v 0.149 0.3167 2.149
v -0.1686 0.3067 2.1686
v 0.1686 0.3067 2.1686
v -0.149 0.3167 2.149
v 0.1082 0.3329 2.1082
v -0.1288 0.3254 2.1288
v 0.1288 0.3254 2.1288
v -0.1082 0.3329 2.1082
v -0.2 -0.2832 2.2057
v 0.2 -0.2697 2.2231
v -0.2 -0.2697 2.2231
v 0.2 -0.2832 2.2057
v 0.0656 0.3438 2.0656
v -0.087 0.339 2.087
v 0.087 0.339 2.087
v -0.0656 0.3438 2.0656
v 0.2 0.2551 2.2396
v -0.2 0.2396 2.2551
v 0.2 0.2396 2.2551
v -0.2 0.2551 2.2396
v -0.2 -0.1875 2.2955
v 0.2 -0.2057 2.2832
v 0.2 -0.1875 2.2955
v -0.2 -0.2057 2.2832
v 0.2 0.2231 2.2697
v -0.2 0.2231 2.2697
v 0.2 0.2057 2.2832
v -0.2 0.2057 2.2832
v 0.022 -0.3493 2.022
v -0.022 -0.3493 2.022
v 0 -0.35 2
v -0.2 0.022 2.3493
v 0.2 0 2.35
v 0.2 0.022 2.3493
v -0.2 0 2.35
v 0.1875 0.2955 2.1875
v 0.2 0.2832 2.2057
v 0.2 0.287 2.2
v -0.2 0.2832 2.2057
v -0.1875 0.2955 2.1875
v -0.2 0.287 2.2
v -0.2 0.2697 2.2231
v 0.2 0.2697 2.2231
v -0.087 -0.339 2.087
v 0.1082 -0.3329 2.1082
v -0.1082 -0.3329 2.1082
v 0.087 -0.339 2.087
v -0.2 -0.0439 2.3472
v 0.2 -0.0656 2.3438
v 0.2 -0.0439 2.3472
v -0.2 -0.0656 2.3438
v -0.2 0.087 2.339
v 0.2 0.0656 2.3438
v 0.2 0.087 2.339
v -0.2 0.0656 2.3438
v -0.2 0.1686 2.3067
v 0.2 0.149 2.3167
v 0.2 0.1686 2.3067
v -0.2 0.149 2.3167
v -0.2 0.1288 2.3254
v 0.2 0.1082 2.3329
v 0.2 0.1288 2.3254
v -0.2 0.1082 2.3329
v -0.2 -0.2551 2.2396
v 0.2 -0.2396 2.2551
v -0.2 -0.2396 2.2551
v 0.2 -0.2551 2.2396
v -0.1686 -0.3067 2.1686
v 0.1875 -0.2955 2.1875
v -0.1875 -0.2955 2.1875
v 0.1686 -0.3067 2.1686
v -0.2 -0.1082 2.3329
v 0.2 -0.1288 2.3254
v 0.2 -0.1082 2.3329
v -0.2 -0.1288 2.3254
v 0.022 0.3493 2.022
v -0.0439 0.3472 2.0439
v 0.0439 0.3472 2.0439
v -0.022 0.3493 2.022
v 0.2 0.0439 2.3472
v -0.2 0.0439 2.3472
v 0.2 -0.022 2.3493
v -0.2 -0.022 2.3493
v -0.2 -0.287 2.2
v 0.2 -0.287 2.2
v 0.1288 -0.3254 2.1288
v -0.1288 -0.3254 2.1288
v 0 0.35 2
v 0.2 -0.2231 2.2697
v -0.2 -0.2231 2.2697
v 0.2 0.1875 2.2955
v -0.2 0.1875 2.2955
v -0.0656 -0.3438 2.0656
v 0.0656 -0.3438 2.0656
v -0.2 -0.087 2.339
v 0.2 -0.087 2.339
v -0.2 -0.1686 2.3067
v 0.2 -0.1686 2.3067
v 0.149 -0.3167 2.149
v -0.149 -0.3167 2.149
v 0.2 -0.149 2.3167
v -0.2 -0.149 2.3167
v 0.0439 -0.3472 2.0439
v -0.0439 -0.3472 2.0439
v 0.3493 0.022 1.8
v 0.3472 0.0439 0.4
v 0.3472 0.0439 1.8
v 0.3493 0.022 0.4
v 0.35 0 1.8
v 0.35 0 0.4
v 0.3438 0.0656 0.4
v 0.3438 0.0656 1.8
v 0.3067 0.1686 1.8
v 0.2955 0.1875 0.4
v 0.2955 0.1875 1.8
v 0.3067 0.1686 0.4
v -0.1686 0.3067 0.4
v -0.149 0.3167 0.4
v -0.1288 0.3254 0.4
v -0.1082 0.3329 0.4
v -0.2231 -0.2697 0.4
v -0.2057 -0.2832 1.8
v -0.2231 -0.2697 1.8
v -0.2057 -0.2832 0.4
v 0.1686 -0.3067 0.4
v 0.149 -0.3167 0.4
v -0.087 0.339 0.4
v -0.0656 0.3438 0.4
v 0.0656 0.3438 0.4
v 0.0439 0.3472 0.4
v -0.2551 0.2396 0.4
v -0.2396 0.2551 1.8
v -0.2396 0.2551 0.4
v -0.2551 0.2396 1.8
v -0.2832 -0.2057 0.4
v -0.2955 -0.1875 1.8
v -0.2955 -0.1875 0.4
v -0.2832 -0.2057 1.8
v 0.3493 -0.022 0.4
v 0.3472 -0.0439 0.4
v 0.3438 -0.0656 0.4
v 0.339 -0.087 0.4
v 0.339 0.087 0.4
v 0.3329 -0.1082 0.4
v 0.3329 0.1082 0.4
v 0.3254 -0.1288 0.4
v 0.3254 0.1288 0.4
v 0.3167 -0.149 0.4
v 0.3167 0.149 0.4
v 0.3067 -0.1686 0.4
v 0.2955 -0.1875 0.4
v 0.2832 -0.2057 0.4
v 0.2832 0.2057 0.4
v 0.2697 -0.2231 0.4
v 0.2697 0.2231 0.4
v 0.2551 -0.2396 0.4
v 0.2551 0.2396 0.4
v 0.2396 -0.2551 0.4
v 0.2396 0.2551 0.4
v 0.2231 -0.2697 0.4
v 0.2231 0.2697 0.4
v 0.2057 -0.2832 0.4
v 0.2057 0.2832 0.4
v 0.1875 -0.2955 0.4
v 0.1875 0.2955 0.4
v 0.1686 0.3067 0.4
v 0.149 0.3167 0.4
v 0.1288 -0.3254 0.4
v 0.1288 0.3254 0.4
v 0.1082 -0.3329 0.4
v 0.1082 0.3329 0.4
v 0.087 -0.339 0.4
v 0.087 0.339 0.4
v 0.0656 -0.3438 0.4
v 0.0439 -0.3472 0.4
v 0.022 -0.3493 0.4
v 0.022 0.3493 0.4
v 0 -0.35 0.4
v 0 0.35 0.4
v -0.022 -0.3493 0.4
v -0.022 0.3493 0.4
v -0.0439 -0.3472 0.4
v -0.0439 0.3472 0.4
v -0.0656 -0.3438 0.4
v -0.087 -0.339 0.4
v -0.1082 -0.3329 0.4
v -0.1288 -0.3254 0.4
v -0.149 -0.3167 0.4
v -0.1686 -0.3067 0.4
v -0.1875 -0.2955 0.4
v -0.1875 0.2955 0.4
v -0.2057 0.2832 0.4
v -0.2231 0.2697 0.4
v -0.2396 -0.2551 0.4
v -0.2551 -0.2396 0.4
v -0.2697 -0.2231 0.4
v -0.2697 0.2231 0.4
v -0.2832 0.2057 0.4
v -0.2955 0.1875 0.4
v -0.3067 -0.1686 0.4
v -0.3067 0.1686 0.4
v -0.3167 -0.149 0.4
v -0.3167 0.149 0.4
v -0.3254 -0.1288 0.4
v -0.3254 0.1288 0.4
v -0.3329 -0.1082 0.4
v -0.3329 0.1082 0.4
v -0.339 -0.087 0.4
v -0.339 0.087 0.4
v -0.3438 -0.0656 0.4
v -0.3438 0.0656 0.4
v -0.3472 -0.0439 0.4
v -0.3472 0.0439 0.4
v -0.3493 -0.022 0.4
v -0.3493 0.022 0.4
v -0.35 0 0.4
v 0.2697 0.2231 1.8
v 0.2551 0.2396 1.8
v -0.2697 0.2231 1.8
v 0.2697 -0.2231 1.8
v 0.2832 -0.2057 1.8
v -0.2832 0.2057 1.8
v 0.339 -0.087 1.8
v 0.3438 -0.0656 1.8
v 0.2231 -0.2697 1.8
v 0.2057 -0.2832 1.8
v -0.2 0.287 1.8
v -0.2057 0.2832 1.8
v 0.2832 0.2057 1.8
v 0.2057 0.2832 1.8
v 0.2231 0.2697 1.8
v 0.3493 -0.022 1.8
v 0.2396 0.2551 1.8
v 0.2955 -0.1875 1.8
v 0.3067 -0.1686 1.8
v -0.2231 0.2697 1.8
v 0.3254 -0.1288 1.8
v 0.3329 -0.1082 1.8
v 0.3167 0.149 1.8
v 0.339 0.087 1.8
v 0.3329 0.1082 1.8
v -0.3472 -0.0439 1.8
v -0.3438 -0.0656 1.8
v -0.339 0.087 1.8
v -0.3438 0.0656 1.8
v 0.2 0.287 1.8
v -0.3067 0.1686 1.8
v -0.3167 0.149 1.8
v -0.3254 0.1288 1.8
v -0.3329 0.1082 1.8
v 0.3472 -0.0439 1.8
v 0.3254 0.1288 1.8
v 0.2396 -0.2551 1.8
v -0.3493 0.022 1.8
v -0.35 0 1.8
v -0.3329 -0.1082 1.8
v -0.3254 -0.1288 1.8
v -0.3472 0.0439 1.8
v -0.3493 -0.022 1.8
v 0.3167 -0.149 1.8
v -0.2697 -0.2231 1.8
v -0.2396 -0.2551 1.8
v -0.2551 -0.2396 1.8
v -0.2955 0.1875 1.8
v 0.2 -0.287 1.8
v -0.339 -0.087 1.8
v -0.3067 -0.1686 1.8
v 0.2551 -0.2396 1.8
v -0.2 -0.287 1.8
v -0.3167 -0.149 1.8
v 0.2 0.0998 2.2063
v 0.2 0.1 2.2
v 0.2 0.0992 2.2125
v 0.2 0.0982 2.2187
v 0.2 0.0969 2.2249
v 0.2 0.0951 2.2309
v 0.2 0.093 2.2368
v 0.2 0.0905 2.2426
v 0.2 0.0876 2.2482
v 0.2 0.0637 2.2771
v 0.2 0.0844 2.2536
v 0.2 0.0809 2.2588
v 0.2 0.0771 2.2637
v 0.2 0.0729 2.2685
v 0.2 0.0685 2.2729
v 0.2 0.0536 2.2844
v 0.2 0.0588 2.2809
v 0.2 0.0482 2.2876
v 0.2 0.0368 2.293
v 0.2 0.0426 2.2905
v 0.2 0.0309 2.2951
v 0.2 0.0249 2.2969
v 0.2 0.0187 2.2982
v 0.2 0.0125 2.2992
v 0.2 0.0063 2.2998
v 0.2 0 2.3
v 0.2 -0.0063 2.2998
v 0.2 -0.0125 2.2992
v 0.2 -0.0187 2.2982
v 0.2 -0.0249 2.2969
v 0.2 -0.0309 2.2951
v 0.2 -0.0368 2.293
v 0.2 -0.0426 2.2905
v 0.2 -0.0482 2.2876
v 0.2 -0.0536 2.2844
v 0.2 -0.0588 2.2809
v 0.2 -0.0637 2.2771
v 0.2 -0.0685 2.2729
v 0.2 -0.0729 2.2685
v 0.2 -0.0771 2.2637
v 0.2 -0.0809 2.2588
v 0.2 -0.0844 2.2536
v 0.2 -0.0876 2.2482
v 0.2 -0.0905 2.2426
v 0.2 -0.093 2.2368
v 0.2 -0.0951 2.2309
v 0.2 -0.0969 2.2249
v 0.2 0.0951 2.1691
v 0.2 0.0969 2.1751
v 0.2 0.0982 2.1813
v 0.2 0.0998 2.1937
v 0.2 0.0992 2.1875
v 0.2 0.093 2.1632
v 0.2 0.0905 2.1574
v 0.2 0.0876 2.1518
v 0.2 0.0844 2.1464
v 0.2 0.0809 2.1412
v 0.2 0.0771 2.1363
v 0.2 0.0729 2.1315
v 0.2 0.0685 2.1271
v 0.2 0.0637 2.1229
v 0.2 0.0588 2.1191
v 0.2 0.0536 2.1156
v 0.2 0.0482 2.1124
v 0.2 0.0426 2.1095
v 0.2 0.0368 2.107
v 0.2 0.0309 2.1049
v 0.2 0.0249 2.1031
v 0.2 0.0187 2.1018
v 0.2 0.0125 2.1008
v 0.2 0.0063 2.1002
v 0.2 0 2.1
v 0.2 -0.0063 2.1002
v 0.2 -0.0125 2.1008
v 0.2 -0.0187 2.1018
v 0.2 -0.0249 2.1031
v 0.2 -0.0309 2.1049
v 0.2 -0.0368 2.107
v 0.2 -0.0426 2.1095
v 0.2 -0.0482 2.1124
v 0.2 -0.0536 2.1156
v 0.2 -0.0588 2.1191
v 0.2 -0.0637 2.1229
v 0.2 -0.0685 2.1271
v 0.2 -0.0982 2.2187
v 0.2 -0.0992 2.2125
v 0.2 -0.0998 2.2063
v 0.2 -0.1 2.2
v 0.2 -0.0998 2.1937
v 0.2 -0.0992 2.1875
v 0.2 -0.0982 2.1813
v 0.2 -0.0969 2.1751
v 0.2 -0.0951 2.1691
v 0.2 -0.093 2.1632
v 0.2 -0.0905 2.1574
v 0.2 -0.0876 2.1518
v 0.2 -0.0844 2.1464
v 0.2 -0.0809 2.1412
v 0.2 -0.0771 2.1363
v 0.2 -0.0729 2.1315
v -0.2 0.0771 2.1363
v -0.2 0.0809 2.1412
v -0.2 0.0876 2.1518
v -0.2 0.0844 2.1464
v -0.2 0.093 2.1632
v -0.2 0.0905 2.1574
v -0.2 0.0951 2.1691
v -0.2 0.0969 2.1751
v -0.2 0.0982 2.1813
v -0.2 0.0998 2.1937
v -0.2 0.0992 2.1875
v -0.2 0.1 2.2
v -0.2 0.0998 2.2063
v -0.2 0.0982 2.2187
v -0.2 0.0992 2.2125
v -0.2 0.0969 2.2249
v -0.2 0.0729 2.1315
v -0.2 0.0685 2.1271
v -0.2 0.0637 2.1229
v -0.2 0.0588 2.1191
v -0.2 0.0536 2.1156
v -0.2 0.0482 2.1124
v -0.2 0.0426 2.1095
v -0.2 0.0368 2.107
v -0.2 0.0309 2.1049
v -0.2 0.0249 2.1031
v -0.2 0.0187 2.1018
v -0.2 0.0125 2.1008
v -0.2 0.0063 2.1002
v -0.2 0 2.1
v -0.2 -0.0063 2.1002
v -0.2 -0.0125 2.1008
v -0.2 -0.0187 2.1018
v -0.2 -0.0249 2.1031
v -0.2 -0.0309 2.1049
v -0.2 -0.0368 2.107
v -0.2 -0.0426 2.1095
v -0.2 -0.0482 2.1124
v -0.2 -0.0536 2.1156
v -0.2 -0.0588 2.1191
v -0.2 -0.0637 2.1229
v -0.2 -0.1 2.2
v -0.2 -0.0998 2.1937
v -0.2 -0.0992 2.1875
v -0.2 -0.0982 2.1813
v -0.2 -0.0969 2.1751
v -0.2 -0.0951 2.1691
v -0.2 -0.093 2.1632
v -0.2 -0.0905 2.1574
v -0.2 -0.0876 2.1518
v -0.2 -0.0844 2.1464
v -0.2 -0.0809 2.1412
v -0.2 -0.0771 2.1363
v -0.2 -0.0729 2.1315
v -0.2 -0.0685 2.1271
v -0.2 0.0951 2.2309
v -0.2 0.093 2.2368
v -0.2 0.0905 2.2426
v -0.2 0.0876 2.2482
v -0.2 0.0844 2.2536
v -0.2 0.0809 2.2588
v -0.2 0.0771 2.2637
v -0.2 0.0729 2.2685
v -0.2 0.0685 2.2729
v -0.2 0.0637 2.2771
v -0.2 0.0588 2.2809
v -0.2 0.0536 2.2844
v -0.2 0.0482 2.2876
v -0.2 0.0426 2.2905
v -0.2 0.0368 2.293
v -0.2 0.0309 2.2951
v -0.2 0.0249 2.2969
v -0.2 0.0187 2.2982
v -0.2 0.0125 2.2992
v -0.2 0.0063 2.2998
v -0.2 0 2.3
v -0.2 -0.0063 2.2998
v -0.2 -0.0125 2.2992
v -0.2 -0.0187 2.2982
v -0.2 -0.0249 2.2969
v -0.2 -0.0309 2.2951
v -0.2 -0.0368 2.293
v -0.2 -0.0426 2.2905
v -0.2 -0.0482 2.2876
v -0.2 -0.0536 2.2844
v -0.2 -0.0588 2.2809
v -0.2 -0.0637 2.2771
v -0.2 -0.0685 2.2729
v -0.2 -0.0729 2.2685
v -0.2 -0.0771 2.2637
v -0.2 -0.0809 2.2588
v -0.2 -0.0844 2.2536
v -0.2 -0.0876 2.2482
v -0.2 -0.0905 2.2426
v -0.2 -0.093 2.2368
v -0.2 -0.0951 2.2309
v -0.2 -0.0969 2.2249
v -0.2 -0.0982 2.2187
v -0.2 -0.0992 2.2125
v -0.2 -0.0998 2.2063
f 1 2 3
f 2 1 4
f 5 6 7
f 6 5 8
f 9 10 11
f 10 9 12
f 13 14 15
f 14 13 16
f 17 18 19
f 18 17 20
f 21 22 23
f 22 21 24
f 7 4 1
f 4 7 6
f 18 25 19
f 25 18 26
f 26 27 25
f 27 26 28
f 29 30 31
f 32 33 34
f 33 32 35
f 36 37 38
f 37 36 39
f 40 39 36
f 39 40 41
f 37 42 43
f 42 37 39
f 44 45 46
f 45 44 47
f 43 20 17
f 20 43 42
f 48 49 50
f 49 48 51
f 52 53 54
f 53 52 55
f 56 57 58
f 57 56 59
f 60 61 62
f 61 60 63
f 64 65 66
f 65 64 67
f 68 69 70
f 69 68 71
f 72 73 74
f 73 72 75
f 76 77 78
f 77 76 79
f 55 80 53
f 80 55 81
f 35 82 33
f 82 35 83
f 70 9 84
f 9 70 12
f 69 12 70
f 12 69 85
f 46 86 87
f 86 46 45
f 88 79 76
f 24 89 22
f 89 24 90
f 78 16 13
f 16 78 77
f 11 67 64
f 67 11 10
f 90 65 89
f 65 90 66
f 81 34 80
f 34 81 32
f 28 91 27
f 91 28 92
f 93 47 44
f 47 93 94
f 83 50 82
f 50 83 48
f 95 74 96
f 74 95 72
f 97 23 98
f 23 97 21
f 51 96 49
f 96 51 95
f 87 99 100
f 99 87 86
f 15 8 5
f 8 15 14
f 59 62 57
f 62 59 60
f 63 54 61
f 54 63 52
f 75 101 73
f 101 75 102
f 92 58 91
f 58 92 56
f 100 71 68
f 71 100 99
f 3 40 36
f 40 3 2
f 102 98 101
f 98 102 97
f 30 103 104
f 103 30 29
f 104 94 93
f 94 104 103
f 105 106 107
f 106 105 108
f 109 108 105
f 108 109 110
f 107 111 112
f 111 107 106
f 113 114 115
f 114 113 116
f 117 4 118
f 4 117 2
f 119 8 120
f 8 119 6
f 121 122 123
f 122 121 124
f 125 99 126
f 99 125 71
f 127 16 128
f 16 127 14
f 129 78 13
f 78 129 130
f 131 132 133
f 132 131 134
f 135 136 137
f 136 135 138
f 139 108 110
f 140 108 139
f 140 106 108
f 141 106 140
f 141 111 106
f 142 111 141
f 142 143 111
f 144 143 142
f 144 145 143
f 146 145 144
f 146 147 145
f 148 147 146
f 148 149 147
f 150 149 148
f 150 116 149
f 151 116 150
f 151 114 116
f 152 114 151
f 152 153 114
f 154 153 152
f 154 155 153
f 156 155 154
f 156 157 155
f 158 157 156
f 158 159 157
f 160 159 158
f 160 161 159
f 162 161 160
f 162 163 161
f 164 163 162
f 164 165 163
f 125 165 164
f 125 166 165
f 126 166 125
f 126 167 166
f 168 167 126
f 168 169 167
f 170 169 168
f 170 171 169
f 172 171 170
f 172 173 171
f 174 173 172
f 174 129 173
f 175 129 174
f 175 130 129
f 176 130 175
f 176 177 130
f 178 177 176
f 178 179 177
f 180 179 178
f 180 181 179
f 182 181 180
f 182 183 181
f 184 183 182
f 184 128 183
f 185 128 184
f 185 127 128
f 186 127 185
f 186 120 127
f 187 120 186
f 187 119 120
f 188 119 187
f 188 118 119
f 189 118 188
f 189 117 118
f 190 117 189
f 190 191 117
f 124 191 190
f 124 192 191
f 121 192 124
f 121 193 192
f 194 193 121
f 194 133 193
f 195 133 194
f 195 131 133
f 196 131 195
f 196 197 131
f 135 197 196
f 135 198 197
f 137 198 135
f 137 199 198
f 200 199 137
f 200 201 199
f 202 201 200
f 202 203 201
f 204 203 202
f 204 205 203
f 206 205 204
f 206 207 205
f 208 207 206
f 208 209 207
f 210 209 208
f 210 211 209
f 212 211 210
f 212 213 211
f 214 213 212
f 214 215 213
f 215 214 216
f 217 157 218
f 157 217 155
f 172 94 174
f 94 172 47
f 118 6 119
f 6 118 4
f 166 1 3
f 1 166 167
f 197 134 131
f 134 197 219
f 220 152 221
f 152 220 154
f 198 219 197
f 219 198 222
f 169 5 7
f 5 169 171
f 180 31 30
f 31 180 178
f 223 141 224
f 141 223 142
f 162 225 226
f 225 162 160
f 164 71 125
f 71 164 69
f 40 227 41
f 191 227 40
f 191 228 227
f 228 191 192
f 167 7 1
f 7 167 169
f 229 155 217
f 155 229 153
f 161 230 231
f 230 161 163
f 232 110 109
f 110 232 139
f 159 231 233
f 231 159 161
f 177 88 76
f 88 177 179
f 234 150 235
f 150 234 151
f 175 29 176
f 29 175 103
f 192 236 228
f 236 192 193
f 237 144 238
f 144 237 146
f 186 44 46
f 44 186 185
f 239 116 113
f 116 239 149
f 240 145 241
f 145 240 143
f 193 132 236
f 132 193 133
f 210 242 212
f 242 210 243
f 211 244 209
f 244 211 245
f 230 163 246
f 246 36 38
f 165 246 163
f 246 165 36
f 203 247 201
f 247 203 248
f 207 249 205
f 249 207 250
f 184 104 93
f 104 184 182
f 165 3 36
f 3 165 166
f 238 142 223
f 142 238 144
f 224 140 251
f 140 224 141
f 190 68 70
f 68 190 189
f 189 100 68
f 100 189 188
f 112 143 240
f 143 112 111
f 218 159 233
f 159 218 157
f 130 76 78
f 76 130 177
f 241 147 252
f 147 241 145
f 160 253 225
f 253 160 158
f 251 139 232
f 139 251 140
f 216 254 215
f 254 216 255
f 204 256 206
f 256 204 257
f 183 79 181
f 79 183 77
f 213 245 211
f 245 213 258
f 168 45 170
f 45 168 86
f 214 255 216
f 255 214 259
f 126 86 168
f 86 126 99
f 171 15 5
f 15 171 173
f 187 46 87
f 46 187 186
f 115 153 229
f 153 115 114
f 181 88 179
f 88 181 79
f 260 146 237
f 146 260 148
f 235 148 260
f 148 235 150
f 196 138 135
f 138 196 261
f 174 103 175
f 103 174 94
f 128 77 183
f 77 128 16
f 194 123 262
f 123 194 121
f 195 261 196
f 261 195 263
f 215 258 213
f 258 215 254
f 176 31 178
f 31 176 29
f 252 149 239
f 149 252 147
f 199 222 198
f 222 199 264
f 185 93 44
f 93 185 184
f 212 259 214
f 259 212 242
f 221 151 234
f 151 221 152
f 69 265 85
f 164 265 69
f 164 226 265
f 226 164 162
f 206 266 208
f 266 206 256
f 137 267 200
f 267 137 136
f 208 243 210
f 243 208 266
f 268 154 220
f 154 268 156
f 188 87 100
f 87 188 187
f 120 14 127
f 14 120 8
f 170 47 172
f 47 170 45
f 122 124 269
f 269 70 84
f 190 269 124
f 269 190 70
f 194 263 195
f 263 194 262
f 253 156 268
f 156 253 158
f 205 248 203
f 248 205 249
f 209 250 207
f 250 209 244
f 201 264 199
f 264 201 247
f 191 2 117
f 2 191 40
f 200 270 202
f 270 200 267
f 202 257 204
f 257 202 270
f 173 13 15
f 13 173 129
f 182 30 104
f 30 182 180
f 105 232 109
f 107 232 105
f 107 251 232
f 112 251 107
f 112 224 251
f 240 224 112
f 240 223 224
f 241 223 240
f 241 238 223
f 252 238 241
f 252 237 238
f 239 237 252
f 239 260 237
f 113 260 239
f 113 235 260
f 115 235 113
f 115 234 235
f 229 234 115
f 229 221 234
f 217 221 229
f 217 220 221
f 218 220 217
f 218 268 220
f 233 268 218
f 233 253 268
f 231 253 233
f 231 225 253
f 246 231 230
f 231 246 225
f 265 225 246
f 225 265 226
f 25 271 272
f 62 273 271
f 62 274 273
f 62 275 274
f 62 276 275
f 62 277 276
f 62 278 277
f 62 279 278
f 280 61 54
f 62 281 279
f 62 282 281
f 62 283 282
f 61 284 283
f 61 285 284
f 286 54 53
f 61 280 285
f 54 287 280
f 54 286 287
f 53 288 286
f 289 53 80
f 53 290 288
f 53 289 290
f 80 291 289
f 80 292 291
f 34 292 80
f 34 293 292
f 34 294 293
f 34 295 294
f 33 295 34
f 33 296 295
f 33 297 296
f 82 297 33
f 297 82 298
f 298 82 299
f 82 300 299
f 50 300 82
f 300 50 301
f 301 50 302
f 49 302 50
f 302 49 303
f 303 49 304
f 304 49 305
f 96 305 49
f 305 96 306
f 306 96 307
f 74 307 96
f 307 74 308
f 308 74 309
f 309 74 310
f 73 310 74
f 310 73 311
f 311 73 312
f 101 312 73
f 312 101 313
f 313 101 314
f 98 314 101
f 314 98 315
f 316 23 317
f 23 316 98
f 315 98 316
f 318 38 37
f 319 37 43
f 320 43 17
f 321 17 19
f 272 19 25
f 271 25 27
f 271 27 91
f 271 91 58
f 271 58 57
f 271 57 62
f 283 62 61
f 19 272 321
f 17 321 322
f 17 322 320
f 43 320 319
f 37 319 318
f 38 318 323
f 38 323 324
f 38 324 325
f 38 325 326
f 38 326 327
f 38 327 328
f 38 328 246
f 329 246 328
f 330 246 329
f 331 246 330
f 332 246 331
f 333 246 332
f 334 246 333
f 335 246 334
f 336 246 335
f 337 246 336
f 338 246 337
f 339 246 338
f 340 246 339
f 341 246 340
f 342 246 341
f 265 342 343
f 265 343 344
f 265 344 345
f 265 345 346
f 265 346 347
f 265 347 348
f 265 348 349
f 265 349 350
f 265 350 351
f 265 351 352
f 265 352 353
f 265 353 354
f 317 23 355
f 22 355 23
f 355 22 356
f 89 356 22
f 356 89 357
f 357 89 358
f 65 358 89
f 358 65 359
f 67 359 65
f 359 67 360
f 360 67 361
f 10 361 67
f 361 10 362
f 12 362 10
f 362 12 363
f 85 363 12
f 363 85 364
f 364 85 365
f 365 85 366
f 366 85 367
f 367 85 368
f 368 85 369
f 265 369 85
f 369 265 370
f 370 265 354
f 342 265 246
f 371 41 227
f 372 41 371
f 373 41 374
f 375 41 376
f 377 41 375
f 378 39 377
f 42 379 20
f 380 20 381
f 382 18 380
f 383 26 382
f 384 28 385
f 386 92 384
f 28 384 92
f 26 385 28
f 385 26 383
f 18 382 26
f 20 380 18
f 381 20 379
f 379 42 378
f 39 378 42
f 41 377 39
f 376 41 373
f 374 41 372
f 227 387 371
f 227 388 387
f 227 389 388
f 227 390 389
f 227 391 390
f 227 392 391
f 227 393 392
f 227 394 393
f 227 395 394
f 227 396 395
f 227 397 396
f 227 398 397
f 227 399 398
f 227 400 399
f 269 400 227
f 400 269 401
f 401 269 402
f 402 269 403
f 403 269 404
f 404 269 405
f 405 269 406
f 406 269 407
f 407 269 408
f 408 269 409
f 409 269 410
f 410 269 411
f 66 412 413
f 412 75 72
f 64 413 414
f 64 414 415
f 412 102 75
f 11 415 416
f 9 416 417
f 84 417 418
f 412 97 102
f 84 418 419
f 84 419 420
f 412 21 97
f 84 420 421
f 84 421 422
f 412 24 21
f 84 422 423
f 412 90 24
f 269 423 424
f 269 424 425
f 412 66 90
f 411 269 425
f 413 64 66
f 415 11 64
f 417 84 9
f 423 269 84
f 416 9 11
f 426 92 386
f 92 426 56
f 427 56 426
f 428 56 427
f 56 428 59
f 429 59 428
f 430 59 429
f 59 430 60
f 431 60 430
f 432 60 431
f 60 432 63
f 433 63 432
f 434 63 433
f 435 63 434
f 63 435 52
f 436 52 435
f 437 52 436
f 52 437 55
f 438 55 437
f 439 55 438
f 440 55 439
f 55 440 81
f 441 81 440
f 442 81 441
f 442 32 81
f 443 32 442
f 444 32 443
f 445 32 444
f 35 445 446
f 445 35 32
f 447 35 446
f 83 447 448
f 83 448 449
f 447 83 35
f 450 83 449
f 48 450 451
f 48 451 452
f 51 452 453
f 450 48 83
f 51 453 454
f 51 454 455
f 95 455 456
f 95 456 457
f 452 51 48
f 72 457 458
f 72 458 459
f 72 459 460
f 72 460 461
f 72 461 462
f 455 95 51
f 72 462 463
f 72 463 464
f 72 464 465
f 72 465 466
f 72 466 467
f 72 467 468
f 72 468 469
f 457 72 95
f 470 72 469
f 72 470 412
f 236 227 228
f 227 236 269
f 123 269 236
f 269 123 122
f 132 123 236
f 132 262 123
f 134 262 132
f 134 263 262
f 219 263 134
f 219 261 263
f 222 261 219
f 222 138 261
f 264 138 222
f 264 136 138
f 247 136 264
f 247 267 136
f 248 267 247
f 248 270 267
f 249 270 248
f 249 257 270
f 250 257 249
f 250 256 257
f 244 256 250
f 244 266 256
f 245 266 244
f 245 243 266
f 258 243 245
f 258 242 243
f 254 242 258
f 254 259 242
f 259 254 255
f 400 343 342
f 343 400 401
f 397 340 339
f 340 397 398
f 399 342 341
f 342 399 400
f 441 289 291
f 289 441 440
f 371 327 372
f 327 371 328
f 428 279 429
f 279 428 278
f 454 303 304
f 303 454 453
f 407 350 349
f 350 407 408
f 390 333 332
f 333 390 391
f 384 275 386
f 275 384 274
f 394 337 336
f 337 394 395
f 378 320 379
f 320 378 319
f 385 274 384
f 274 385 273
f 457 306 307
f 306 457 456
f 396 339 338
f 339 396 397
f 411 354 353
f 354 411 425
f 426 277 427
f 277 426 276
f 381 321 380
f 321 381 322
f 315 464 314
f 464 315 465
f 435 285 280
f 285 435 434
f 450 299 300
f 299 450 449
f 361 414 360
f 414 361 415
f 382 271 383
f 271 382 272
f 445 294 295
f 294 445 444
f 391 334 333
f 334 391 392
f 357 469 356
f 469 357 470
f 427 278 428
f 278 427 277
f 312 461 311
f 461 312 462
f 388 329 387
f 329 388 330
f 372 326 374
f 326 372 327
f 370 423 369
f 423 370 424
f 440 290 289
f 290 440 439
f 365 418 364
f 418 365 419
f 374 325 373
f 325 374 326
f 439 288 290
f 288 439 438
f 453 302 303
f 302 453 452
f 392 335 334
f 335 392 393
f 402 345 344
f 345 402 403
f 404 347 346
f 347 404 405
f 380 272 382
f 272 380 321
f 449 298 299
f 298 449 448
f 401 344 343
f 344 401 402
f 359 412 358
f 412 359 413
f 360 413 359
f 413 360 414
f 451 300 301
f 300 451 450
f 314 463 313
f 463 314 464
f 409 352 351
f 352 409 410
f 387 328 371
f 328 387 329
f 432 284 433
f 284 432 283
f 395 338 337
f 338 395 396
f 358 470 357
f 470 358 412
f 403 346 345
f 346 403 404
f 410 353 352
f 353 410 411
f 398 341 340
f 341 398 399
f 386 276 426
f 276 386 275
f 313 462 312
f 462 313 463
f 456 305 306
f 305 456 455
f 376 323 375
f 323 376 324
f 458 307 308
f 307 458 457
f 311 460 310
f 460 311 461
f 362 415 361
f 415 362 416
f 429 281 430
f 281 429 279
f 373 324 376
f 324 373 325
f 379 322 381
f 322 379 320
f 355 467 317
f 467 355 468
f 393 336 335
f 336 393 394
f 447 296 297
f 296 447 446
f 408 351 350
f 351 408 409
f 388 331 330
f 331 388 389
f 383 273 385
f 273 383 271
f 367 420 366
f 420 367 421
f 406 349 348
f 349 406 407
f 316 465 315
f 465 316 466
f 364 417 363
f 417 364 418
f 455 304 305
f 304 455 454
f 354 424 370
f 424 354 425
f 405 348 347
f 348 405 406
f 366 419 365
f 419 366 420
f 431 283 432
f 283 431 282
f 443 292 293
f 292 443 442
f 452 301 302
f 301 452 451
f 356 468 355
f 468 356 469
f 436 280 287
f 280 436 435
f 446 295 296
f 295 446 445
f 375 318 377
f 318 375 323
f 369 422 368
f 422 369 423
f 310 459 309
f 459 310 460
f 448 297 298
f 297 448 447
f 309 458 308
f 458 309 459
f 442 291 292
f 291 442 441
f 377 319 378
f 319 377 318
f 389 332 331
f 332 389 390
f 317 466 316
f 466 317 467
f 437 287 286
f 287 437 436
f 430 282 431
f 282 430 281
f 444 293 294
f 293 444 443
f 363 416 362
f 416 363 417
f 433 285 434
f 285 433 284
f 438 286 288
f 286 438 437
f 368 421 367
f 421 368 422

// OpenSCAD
// proximal_arm.scad Proximal arm
size_per = 1/100;

proximal_arm();

module proximal_arm(length=200, width=35, base_rad=50, end_rad=50*size_per,start_x =0,start_y=0, start_z=40, $fn=100) {
    length = length*size_per;
    width = width*size_per;
    base_rad = base_rad*size_per;
    end_rad = end_rad*size_per;
    
    start_coord = [start_x*size_per, start_y*size_per, start_z*size_per];
    
    difference(){
        translate(start_coord) cylinder(h=length, r=width);
        translate([20*size_per, -length/4, (start_z*(4.5))*size_per]) cube(length);
        translate([-length-(20*size_per), -length/4, (start_z*(4.5))*size_per]) cube(length);
        translate([-length/2,0,(start_z*size_per/2)+length]) rotate([0,90,0]) cylinder(h=length,r=10*size_per);
        translate([0,0,200*size_per]) arm_radius_cutter();

        }
    }

module arm_radius_cutter($fn=100){
    cube_size = 100*size_per;
    
    difference(){
        translate([-cube_size/2, -cube_size/2, 0]) cube(cube_size);
        rotate([0,90,0]) cylinder(h=cube_size*1.1, r=35*size_per,center=true);
    }
}
